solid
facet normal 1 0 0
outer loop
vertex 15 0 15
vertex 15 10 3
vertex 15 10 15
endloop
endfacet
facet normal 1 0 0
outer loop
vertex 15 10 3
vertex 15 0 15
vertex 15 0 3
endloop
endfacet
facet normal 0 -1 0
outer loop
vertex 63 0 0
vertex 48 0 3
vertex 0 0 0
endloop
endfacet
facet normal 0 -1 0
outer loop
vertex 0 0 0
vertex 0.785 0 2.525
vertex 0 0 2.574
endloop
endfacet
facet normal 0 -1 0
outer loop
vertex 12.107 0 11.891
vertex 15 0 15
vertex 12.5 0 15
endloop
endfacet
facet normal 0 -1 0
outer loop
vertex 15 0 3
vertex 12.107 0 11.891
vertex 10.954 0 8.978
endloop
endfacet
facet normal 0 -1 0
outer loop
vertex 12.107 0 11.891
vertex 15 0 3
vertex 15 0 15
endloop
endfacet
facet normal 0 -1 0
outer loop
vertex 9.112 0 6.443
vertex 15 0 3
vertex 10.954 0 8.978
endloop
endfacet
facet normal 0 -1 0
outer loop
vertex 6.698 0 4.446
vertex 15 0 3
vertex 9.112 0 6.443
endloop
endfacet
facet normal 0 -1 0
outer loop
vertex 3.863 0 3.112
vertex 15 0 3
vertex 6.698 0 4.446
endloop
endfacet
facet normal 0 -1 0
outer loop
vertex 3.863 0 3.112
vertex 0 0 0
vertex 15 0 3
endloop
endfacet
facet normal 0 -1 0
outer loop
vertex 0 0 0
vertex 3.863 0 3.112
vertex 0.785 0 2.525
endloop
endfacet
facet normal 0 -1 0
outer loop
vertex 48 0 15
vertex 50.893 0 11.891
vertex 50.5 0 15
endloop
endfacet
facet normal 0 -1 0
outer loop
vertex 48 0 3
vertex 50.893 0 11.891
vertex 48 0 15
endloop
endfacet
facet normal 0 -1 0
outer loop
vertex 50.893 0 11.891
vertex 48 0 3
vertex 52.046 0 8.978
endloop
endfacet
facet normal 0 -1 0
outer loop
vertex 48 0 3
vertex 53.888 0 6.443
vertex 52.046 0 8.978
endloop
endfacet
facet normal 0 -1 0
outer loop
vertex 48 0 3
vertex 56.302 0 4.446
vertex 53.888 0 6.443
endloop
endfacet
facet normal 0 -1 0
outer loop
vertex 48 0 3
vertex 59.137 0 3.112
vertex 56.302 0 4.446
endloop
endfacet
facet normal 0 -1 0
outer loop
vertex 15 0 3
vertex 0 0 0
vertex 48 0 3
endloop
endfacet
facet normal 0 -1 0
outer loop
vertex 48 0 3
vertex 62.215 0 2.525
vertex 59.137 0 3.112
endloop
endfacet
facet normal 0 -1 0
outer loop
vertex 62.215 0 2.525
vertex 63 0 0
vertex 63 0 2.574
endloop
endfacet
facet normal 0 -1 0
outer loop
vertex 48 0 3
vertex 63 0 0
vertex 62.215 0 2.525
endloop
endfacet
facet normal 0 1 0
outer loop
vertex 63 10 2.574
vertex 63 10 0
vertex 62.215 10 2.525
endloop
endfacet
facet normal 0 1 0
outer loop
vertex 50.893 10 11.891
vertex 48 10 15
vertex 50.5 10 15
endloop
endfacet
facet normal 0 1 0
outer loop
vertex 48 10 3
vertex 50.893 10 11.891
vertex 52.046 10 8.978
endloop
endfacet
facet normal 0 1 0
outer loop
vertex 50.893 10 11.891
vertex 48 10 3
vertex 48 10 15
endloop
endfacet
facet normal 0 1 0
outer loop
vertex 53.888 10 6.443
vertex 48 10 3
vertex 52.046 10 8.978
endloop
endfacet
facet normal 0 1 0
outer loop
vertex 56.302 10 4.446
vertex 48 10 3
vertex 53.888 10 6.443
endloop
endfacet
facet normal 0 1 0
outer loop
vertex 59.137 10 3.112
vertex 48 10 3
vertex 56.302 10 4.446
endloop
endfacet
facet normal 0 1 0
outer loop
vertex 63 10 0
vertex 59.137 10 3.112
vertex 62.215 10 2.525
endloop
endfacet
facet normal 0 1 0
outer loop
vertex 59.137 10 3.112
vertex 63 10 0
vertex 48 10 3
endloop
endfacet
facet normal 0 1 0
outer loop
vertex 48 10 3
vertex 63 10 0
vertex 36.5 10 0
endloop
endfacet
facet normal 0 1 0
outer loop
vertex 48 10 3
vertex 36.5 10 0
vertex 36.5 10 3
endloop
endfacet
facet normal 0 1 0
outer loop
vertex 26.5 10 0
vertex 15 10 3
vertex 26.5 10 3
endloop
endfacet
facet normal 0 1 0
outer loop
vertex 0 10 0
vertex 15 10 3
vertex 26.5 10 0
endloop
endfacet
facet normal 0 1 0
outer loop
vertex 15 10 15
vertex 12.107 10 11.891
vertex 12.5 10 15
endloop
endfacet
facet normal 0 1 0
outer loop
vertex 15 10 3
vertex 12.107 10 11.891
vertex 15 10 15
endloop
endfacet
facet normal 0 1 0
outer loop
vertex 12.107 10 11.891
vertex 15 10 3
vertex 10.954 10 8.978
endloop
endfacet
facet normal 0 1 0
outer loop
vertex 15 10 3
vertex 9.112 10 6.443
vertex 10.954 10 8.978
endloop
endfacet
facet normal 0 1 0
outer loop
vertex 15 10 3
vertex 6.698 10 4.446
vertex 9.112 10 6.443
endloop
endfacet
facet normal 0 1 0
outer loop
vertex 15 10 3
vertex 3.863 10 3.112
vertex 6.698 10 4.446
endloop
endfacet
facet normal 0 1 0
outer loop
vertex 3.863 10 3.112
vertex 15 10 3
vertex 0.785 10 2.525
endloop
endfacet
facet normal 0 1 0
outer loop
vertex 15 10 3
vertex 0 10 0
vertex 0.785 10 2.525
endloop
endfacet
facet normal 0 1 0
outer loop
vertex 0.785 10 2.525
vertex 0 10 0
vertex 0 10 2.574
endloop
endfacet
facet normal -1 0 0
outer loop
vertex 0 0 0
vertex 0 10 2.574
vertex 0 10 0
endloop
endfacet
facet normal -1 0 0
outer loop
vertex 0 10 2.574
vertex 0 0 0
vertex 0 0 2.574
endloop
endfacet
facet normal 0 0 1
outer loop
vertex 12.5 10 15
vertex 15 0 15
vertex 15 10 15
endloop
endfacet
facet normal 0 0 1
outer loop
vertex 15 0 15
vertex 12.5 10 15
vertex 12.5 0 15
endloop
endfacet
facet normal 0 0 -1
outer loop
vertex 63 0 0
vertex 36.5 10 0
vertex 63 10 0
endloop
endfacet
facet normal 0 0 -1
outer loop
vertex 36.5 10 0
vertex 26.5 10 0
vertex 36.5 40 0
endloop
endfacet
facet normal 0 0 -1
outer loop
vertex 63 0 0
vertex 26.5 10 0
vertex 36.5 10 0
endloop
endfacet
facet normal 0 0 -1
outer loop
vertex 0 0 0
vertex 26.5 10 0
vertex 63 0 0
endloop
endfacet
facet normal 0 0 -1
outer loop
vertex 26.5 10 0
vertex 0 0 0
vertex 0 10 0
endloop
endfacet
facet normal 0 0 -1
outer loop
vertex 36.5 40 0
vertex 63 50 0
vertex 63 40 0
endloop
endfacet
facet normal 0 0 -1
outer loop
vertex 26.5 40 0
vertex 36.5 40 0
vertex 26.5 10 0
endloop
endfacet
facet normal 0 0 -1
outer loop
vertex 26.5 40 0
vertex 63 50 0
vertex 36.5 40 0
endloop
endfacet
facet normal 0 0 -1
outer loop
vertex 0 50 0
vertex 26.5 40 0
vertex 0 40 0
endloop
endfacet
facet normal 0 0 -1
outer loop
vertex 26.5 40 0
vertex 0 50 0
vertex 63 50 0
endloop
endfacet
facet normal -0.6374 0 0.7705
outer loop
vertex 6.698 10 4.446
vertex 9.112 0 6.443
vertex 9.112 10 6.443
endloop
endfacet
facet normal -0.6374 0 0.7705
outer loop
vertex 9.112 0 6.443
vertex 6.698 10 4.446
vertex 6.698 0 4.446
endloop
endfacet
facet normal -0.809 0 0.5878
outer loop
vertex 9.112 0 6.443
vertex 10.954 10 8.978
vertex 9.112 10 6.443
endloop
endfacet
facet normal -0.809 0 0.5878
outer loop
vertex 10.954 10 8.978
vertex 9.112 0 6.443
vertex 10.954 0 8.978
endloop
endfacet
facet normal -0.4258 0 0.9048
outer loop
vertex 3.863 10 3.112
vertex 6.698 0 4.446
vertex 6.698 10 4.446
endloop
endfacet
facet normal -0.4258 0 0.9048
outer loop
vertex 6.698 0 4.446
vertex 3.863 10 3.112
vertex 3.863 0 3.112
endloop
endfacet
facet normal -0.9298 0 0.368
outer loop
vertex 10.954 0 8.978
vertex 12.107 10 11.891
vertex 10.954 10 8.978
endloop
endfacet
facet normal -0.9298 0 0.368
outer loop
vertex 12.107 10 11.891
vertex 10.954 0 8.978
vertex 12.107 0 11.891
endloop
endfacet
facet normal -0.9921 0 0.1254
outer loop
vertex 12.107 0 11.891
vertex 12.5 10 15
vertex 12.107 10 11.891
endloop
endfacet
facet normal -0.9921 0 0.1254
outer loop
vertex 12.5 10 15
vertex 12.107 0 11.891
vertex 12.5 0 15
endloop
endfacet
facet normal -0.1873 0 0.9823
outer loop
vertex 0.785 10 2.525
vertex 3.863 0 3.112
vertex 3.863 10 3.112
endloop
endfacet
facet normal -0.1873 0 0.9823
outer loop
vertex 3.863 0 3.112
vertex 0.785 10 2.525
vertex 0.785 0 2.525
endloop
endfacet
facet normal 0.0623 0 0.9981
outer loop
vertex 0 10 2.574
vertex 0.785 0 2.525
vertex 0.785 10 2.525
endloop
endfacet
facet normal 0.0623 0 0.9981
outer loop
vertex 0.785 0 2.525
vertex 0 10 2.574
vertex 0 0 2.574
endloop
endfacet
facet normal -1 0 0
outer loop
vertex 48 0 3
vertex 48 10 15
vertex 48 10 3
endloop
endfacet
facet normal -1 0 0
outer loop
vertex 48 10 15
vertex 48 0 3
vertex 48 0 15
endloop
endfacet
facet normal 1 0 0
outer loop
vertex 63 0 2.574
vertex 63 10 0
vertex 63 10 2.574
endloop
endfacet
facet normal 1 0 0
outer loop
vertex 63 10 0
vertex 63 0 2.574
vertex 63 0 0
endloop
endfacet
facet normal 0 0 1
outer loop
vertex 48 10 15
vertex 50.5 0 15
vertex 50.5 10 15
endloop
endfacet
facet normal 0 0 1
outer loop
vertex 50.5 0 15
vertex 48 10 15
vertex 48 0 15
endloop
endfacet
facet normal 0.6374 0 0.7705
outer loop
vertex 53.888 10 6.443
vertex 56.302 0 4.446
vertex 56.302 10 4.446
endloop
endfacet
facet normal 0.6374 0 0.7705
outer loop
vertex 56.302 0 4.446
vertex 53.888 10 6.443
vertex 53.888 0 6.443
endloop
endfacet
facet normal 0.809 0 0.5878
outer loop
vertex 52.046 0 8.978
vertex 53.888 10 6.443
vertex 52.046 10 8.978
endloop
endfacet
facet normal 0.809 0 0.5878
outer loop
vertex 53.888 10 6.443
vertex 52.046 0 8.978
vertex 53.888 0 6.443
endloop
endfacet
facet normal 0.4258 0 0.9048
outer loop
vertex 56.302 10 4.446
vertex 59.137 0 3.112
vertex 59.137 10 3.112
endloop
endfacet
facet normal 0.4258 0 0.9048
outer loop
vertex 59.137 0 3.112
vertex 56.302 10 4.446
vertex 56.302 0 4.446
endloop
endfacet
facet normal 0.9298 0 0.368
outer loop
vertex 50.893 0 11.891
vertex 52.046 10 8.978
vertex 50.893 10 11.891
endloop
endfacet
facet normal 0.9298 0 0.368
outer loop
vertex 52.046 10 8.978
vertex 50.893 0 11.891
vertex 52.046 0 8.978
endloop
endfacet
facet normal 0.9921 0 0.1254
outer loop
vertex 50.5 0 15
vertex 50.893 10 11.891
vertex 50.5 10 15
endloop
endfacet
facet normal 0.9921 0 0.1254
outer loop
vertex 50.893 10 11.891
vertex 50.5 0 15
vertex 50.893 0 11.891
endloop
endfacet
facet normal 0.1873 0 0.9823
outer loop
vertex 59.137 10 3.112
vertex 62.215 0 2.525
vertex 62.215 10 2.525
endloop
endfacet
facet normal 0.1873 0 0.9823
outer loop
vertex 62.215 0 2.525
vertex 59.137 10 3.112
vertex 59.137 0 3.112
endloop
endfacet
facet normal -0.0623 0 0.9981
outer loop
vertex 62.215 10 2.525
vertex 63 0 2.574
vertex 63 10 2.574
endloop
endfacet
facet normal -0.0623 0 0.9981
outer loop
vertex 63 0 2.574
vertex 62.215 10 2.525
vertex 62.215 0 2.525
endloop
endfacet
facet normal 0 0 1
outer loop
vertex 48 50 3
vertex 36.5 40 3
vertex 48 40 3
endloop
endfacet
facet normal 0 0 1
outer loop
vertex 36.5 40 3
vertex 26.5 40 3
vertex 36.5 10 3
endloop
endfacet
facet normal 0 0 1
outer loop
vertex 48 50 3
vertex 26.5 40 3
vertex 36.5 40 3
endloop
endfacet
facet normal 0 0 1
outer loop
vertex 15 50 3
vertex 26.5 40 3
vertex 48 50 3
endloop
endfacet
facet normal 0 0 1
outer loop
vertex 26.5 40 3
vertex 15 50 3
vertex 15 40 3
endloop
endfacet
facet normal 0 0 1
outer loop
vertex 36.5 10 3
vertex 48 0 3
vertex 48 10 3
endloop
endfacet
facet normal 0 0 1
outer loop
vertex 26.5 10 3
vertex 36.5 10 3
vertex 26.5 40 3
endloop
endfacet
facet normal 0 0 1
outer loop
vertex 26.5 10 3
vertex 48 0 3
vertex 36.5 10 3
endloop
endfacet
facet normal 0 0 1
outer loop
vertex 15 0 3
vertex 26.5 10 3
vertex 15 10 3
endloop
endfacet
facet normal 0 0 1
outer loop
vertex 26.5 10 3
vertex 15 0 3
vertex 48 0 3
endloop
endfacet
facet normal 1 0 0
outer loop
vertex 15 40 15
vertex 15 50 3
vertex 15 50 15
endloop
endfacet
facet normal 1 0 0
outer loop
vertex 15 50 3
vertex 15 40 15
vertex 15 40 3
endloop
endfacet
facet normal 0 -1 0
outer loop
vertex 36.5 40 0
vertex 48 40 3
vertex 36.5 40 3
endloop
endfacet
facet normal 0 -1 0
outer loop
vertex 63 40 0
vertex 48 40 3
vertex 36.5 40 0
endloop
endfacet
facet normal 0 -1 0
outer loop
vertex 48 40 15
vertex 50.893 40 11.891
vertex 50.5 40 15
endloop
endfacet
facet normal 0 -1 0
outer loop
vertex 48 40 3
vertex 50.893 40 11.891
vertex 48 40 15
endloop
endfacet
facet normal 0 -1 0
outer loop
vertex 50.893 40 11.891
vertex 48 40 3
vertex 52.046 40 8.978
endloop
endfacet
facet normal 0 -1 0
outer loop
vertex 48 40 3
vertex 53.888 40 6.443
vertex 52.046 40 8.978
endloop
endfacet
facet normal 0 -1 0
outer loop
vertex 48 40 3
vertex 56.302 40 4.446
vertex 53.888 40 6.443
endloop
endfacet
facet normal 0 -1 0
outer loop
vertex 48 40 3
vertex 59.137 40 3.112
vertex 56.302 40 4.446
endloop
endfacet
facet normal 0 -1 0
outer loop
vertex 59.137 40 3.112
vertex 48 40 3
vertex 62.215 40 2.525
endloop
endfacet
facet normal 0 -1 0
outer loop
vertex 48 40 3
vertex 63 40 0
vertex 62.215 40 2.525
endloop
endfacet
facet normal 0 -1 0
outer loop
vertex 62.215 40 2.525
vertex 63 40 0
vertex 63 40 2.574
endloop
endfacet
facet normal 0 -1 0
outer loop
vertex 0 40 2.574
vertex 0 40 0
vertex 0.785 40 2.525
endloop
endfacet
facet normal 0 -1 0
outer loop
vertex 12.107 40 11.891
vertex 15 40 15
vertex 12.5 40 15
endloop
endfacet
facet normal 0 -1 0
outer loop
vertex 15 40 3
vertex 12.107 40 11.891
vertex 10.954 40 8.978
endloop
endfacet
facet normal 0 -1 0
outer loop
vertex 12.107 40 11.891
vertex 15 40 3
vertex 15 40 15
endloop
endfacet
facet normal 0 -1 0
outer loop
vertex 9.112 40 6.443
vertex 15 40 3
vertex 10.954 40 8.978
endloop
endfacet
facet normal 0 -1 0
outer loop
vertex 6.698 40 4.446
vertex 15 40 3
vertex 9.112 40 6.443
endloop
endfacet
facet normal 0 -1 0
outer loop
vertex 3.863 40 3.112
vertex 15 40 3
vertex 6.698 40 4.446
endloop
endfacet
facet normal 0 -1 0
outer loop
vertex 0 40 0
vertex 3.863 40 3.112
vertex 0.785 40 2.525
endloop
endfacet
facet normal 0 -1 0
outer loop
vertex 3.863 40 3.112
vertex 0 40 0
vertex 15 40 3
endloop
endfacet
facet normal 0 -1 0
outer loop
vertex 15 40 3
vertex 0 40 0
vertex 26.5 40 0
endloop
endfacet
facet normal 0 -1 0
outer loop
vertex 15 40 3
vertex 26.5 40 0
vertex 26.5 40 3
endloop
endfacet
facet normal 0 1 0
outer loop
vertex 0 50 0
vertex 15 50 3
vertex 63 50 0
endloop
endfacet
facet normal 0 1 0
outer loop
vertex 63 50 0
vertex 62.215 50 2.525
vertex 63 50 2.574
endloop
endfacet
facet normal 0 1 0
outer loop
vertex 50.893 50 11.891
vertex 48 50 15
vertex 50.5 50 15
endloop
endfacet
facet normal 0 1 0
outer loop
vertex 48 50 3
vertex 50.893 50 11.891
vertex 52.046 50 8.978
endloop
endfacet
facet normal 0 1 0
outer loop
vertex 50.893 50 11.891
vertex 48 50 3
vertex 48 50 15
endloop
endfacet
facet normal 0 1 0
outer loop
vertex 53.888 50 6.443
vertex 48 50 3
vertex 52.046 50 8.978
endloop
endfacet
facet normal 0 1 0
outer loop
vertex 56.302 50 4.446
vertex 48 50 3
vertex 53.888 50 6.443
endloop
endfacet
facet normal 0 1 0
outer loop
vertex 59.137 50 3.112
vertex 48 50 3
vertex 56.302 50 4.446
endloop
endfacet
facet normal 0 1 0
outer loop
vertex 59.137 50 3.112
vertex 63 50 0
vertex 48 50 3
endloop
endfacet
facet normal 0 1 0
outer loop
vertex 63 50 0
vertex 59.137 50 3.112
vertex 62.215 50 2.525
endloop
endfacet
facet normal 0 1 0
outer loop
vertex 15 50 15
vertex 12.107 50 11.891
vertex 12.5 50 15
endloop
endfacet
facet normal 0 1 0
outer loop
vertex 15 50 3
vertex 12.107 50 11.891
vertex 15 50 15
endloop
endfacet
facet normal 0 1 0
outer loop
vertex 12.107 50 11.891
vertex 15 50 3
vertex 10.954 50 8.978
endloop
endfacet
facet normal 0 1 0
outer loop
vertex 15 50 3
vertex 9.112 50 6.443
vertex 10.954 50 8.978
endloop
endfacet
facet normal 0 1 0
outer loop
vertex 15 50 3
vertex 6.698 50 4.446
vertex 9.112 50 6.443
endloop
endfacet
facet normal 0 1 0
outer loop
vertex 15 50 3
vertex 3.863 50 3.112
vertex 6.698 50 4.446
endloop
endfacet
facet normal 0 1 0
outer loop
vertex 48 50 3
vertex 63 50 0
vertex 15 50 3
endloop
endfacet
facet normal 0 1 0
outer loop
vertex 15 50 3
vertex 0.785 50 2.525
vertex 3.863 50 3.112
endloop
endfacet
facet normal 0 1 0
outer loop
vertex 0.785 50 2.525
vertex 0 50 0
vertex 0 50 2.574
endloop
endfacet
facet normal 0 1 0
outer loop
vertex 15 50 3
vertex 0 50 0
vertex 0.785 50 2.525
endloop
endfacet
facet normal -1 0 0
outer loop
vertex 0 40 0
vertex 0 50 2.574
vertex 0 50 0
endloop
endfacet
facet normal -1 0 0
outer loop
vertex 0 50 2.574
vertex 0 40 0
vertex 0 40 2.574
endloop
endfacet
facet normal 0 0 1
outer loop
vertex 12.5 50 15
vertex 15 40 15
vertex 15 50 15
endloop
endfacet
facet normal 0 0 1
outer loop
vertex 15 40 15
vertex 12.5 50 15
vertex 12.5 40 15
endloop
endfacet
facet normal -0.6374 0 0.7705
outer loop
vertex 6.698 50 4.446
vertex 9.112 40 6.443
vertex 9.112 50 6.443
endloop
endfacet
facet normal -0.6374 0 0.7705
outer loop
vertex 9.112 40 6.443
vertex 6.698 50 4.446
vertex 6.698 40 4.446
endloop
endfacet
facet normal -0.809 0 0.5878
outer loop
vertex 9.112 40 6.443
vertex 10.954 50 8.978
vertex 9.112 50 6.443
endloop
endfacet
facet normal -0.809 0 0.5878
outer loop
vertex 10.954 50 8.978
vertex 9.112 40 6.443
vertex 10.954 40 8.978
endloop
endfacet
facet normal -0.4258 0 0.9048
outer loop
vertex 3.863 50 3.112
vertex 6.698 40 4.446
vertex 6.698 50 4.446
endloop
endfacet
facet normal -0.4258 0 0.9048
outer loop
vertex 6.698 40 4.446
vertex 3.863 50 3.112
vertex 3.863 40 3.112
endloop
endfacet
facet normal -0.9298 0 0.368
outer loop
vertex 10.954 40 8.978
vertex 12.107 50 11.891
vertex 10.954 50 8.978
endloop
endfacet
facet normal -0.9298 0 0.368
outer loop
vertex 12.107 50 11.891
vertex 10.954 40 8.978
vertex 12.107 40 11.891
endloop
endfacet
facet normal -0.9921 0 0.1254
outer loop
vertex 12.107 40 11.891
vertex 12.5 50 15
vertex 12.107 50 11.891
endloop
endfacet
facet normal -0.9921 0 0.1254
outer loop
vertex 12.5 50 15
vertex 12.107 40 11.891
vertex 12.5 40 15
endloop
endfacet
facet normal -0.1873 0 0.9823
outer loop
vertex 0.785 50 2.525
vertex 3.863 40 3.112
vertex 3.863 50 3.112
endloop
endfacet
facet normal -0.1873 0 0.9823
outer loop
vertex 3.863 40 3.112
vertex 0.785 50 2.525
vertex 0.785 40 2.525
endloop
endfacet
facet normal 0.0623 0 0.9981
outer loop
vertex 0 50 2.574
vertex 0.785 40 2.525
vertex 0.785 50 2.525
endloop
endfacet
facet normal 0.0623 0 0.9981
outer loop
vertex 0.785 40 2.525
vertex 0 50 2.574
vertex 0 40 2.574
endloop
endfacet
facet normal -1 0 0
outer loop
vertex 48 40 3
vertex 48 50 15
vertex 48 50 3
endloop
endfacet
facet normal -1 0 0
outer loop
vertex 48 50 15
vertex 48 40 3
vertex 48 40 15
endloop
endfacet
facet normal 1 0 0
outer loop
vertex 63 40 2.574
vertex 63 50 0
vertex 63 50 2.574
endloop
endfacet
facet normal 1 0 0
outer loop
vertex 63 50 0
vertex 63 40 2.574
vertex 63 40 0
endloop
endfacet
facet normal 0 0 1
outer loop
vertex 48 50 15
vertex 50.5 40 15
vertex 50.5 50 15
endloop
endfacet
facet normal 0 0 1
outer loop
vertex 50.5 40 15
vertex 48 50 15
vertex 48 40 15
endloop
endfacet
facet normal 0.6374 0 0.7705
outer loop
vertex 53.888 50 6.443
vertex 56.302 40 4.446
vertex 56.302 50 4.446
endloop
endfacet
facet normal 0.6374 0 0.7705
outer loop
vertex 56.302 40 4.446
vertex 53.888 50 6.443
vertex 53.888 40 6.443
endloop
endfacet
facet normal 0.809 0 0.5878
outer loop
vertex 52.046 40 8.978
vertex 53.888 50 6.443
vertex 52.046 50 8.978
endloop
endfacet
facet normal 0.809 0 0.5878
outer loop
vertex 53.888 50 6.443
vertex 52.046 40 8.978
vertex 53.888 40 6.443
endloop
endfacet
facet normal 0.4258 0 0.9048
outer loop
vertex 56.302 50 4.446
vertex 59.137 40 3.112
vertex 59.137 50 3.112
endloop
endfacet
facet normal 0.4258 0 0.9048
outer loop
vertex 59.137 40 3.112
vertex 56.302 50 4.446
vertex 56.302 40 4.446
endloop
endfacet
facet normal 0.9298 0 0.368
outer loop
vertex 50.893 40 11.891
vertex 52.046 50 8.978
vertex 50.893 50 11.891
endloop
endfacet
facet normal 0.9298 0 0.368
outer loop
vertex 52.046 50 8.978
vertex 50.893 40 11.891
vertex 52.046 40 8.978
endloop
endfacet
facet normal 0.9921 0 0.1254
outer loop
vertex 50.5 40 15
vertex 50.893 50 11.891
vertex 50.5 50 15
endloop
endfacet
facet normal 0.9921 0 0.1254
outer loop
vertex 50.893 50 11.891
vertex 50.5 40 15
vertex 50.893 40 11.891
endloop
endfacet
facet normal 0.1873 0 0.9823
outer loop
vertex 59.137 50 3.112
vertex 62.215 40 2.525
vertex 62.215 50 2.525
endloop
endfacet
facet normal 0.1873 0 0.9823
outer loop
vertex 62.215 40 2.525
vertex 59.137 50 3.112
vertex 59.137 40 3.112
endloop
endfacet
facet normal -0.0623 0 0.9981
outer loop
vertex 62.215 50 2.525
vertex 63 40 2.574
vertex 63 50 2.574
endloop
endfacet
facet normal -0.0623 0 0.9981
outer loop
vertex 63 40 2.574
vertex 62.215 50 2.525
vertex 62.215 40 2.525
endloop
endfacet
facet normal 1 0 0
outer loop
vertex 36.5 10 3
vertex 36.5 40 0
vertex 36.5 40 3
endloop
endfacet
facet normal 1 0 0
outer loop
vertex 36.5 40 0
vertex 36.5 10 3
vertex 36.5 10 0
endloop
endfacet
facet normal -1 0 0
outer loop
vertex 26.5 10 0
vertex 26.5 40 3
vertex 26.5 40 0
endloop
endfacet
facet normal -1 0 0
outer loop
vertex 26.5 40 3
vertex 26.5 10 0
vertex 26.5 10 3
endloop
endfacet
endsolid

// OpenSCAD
//Width of the object that goes into the stand
width = 33; // [0:0.5:100]
//Length of the bridge between both feet
length = 30; // [0:0.5:100]
//Thickness of the feet
thickness = 10; // [1:0.5:100]

module side()
{
 difference()
 {
  translate([0,0,-thickness/2])
  cube([15, 15, thickness]);
  translate([0,15,0])
  cylinder(d=25, h=thickness+2, $fn=25, center=true);
 }
}

module end()
{
 translate([0, 0, thickness/2])
 side();

 translate([15-1, 0, 0])
 cube([width+2, 3, thickness]);

 translate([width, 0, 0])
 translate([30, 0, , thickness/2])
 mirror([1,0,0])
 side();
}

module model()
{
 translate([0,thickness,0])
 rotate([90,0,0])
 end();

 translate([15+width/2-thickness/2,thickness-1,0])
 cube([thickness, length+2, 3]);

 translate([0,thickness+length+thickness,0])
 rotate([90,0,0])
 end();
}

model();
